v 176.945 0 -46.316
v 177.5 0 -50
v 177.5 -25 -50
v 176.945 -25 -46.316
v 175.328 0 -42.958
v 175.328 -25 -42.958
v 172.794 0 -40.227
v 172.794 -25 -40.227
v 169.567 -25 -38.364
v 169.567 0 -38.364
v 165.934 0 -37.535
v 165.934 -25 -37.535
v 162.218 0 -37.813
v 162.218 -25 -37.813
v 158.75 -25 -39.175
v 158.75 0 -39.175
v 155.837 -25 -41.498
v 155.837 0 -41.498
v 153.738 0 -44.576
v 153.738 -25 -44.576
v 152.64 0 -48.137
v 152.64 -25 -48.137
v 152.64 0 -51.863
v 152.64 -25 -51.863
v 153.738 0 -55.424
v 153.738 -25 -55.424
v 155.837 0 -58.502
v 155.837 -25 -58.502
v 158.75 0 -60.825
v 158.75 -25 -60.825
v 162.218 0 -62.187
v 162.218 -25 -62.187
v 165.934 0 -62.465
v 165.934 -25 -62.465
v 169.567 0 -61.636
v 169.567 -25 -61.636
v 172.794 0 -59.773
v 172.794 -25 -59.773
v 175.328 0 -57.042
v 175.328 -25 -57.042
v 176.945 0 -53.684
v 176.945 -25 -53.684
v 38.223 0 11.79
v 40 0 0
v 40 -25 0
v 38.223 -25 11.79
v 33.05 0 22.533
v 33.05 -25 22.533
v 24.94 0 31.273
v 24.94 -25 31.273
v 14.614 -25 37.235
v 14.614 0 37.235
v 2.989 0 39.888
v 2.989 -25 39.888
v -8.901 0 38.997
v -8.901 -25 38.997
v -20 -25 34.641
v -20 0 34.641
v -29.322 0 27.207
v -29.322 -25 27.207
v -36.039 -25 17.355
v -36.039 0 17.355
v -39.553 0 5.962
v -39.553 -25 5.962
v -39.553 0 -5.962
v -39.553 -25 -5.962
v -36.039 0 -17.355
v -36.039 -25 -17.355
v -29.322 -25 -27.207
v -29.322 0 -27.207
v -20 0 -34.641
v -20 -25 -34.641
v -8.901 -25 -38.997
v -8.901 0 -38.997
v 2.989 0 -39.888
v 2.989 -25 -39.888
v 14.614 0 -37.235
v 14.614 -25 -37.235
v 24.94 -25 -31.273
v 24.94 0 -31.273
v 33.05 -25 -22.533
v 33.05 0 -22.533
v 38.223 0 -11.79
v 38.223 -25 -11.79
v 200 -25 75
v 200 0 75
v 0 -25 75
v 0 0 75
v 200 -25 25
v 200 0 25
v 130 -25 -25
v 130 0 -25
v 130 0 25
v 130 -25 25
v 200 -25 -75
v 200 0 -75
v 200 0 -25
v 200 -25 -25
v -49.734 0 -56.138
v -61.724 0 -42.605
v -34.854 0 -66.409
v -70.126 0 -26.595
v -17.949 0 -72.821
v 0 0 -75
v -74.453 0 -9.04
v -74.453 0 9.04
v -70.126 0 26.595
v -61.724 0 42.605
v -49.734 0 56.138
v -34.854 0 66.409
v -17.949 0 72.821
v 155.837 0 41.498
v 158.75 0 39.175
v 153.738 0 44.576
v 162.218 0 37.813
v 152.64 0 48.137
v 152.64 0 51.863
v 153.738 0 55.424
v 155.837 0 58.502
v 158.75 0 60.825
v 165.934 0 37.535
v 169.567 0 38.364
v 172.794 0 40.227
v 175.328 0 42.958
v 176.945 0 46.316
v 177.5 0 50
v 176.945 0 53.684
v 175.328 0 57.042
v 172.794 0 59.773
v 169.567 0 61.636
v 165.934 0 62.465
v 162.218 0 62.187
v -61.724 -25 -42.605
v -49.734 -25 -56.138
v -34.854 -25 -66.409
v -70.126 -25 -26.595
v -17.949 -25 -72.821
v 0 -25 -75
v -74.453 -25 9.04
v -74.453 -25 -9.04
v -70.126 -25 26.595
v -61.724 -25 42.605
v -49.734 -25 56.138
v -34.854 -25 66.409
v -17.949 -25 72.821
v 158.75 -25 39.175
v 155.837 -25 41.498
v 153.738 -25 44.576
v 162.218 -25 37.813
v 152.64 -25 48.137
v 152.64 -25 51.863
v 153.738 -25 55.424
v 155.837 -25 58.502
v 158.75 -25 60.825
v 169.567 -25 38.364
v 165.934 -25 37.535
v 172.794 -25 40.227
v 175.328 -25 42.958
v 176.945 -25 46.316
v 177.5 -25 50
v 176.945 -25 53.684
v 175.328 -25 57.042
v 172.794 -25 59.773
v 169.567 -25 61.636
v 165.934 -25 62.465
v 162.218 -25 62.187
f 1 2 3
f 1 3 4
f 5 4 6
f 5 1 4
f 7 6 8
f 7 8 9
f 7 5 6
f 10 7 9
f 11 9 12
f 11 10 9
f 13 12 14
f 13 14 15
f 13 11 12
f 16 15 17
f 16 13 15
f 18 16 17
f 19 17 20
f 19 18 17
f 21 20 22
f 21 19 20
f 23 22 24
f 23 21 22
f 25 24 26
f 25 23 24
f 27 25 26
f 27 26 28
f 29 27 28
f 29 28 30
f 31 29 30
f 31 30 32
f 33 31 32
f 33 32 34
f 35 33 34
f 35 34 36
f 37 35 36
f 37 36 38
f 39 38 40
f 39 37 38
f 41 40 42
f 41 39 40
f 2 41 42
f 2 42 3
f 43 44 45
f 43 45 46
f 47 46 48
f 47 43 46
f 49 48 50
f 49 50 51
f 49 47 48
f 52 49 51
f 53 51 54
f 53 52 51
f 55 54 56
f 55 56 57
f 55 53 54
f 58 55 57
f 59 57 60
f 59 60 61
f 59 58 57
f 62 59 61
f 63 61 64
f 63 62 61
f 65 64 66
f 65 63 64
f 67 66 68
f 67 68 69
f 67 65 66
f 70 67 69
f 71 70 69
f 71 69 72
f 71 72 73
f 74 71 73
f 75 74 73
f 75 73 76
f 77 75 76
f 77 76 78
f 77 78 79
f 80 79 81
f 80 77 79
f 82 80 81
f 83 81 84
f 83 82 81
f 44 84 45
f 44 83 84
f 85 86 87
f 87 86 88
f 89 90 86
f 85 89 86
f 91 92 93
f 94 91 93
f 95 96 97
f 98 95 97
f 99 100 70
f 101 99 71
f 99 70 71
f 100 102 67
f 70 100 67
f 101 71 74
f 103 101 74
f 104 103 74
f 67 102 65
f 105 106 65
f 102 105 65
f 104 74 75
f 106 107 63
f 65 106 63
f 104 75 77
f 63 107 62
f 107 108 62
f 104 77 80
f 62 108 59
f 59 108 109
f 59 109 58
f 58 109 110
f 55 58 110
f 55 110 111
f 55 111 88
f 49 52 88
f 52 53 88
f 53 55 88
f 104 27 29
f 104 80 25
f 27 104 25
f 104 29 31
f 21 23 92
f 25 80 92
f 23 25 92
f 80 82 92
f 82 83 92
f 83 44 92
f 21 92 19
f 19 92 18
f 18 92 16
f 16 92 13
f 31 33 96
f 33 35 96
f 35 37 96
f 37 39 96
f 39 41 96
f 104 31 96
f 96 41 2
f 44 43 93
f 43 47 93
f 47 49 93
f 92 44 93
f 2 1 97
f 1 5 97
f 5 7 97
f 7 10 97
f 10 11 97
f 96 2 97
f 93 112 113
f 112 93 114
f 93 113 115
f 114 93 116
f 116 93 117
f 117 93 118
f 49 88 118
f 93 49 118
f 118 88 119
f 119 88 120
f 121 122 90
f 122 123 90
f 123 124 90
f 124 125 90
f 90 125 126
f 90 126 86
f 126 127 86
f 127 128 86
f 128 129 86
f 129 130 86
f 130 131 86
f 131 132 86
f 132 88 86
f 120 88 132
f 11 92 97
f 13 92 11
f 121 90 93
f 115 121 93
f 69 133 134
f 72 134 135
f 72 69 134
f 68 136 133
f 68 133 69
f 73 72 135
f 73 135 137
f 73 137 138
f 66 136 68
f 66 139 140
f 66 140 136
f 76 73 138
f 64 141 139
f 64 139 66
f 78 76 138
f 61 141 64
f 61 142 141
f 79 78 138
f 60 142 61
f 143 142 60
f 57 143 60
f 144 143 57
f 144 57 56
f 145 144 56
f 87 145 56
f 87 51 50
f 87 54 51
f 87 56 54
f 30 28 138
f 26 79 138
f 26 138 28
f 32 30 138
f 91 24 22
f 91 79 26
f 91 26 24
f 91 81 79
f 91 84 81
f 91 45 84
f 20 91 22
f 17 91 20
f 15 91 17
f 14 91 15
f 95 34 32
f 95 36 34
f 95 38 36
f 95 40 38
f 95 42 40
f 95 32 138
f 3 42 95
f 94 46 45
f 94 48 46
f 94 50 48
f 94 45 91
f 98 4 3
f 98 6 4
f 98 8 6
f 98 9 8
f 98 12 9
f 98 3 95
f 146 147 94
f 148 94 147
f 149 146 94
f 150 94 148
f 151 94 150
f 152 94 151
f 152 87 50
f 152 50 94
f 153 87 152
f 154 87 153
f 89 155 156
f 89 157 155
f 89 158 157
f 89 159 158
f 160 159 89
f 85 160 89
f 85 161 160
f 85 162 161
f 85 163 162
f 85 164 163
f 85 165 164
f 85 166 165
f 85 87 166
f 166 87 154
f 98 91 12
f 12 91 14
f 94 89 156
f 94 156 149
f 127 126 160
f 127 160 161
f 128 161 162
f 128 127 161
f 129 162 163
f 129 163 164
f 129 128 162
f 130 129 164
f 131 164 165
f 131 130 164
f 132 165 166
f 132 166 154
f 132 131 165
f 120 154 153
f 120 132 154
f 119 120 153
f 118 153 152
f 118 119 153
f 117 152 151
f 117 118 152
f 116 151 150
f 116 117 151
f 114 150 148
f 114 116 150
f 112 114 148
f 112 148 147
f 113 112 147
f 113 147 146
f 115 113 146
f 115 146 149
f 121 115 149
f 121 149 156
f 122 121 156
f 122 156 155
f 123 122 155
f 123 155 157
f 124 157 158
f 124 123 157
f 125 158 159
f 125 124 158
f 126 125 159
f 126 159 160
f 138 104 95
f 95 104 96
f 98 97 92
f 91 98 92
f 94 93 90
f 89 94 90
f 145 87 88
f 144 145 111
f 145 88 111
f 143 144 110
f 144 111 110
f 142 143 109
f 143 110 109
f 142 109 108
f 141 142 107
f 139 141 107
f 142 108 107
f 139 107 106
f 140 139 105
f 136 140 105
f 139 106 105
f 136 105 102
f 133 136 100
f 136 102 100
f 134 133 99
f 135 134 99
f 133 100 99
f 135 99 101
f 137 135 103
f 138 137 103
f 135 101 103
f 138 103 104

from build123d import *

# Parameters (mm, degrees)
F0_R     = 12.5
F0_R_2   = 40
F1_DEPTH = 25


with BuildPart() as f1:
    # F0 (on Front) → F1 (new body)
    with BuildSketch(Plane.XZ):
        with BuildLine():
            ThreePointArc((0, 75), (53.033009, 53.033009), (75, 0))
            ThreePointArc((75, 0), (53.033009, -53.033009), (0, -75))
            Line((0, -75), (200, -75))
            Line((200, -75), (200, -25))
            Line((200, -25), (130, -25))
            Line((130, -25), (130, 25))
            Line((130, 25), (200, 25))
            Line((200, 25), (200, 75))
            Line((200, 75), (0, 75))
        make_face()
        with Locations((165, -50)):
            Circle(F0_R, mode=Mode.SUBTRACT)
        with Locations((165, 50)):
            Circle(F0_R, mode=Mode.SUBTRACT)
        with BuildLine():
            ThreePointArc((0, -75), (53.033009, -53.033009), (75, 0))
            ThreePointArc((75, 0), (53.033009, 53.033009), (0, 75))
            ThreePointArc((0, 75), (-75, 0), (0, -75))
        make_face()
        Circle(F0_R_2, mode=Mode.SUBTRACT)
    extrude(amount=F1_DEPTH)


solid = f1.part
